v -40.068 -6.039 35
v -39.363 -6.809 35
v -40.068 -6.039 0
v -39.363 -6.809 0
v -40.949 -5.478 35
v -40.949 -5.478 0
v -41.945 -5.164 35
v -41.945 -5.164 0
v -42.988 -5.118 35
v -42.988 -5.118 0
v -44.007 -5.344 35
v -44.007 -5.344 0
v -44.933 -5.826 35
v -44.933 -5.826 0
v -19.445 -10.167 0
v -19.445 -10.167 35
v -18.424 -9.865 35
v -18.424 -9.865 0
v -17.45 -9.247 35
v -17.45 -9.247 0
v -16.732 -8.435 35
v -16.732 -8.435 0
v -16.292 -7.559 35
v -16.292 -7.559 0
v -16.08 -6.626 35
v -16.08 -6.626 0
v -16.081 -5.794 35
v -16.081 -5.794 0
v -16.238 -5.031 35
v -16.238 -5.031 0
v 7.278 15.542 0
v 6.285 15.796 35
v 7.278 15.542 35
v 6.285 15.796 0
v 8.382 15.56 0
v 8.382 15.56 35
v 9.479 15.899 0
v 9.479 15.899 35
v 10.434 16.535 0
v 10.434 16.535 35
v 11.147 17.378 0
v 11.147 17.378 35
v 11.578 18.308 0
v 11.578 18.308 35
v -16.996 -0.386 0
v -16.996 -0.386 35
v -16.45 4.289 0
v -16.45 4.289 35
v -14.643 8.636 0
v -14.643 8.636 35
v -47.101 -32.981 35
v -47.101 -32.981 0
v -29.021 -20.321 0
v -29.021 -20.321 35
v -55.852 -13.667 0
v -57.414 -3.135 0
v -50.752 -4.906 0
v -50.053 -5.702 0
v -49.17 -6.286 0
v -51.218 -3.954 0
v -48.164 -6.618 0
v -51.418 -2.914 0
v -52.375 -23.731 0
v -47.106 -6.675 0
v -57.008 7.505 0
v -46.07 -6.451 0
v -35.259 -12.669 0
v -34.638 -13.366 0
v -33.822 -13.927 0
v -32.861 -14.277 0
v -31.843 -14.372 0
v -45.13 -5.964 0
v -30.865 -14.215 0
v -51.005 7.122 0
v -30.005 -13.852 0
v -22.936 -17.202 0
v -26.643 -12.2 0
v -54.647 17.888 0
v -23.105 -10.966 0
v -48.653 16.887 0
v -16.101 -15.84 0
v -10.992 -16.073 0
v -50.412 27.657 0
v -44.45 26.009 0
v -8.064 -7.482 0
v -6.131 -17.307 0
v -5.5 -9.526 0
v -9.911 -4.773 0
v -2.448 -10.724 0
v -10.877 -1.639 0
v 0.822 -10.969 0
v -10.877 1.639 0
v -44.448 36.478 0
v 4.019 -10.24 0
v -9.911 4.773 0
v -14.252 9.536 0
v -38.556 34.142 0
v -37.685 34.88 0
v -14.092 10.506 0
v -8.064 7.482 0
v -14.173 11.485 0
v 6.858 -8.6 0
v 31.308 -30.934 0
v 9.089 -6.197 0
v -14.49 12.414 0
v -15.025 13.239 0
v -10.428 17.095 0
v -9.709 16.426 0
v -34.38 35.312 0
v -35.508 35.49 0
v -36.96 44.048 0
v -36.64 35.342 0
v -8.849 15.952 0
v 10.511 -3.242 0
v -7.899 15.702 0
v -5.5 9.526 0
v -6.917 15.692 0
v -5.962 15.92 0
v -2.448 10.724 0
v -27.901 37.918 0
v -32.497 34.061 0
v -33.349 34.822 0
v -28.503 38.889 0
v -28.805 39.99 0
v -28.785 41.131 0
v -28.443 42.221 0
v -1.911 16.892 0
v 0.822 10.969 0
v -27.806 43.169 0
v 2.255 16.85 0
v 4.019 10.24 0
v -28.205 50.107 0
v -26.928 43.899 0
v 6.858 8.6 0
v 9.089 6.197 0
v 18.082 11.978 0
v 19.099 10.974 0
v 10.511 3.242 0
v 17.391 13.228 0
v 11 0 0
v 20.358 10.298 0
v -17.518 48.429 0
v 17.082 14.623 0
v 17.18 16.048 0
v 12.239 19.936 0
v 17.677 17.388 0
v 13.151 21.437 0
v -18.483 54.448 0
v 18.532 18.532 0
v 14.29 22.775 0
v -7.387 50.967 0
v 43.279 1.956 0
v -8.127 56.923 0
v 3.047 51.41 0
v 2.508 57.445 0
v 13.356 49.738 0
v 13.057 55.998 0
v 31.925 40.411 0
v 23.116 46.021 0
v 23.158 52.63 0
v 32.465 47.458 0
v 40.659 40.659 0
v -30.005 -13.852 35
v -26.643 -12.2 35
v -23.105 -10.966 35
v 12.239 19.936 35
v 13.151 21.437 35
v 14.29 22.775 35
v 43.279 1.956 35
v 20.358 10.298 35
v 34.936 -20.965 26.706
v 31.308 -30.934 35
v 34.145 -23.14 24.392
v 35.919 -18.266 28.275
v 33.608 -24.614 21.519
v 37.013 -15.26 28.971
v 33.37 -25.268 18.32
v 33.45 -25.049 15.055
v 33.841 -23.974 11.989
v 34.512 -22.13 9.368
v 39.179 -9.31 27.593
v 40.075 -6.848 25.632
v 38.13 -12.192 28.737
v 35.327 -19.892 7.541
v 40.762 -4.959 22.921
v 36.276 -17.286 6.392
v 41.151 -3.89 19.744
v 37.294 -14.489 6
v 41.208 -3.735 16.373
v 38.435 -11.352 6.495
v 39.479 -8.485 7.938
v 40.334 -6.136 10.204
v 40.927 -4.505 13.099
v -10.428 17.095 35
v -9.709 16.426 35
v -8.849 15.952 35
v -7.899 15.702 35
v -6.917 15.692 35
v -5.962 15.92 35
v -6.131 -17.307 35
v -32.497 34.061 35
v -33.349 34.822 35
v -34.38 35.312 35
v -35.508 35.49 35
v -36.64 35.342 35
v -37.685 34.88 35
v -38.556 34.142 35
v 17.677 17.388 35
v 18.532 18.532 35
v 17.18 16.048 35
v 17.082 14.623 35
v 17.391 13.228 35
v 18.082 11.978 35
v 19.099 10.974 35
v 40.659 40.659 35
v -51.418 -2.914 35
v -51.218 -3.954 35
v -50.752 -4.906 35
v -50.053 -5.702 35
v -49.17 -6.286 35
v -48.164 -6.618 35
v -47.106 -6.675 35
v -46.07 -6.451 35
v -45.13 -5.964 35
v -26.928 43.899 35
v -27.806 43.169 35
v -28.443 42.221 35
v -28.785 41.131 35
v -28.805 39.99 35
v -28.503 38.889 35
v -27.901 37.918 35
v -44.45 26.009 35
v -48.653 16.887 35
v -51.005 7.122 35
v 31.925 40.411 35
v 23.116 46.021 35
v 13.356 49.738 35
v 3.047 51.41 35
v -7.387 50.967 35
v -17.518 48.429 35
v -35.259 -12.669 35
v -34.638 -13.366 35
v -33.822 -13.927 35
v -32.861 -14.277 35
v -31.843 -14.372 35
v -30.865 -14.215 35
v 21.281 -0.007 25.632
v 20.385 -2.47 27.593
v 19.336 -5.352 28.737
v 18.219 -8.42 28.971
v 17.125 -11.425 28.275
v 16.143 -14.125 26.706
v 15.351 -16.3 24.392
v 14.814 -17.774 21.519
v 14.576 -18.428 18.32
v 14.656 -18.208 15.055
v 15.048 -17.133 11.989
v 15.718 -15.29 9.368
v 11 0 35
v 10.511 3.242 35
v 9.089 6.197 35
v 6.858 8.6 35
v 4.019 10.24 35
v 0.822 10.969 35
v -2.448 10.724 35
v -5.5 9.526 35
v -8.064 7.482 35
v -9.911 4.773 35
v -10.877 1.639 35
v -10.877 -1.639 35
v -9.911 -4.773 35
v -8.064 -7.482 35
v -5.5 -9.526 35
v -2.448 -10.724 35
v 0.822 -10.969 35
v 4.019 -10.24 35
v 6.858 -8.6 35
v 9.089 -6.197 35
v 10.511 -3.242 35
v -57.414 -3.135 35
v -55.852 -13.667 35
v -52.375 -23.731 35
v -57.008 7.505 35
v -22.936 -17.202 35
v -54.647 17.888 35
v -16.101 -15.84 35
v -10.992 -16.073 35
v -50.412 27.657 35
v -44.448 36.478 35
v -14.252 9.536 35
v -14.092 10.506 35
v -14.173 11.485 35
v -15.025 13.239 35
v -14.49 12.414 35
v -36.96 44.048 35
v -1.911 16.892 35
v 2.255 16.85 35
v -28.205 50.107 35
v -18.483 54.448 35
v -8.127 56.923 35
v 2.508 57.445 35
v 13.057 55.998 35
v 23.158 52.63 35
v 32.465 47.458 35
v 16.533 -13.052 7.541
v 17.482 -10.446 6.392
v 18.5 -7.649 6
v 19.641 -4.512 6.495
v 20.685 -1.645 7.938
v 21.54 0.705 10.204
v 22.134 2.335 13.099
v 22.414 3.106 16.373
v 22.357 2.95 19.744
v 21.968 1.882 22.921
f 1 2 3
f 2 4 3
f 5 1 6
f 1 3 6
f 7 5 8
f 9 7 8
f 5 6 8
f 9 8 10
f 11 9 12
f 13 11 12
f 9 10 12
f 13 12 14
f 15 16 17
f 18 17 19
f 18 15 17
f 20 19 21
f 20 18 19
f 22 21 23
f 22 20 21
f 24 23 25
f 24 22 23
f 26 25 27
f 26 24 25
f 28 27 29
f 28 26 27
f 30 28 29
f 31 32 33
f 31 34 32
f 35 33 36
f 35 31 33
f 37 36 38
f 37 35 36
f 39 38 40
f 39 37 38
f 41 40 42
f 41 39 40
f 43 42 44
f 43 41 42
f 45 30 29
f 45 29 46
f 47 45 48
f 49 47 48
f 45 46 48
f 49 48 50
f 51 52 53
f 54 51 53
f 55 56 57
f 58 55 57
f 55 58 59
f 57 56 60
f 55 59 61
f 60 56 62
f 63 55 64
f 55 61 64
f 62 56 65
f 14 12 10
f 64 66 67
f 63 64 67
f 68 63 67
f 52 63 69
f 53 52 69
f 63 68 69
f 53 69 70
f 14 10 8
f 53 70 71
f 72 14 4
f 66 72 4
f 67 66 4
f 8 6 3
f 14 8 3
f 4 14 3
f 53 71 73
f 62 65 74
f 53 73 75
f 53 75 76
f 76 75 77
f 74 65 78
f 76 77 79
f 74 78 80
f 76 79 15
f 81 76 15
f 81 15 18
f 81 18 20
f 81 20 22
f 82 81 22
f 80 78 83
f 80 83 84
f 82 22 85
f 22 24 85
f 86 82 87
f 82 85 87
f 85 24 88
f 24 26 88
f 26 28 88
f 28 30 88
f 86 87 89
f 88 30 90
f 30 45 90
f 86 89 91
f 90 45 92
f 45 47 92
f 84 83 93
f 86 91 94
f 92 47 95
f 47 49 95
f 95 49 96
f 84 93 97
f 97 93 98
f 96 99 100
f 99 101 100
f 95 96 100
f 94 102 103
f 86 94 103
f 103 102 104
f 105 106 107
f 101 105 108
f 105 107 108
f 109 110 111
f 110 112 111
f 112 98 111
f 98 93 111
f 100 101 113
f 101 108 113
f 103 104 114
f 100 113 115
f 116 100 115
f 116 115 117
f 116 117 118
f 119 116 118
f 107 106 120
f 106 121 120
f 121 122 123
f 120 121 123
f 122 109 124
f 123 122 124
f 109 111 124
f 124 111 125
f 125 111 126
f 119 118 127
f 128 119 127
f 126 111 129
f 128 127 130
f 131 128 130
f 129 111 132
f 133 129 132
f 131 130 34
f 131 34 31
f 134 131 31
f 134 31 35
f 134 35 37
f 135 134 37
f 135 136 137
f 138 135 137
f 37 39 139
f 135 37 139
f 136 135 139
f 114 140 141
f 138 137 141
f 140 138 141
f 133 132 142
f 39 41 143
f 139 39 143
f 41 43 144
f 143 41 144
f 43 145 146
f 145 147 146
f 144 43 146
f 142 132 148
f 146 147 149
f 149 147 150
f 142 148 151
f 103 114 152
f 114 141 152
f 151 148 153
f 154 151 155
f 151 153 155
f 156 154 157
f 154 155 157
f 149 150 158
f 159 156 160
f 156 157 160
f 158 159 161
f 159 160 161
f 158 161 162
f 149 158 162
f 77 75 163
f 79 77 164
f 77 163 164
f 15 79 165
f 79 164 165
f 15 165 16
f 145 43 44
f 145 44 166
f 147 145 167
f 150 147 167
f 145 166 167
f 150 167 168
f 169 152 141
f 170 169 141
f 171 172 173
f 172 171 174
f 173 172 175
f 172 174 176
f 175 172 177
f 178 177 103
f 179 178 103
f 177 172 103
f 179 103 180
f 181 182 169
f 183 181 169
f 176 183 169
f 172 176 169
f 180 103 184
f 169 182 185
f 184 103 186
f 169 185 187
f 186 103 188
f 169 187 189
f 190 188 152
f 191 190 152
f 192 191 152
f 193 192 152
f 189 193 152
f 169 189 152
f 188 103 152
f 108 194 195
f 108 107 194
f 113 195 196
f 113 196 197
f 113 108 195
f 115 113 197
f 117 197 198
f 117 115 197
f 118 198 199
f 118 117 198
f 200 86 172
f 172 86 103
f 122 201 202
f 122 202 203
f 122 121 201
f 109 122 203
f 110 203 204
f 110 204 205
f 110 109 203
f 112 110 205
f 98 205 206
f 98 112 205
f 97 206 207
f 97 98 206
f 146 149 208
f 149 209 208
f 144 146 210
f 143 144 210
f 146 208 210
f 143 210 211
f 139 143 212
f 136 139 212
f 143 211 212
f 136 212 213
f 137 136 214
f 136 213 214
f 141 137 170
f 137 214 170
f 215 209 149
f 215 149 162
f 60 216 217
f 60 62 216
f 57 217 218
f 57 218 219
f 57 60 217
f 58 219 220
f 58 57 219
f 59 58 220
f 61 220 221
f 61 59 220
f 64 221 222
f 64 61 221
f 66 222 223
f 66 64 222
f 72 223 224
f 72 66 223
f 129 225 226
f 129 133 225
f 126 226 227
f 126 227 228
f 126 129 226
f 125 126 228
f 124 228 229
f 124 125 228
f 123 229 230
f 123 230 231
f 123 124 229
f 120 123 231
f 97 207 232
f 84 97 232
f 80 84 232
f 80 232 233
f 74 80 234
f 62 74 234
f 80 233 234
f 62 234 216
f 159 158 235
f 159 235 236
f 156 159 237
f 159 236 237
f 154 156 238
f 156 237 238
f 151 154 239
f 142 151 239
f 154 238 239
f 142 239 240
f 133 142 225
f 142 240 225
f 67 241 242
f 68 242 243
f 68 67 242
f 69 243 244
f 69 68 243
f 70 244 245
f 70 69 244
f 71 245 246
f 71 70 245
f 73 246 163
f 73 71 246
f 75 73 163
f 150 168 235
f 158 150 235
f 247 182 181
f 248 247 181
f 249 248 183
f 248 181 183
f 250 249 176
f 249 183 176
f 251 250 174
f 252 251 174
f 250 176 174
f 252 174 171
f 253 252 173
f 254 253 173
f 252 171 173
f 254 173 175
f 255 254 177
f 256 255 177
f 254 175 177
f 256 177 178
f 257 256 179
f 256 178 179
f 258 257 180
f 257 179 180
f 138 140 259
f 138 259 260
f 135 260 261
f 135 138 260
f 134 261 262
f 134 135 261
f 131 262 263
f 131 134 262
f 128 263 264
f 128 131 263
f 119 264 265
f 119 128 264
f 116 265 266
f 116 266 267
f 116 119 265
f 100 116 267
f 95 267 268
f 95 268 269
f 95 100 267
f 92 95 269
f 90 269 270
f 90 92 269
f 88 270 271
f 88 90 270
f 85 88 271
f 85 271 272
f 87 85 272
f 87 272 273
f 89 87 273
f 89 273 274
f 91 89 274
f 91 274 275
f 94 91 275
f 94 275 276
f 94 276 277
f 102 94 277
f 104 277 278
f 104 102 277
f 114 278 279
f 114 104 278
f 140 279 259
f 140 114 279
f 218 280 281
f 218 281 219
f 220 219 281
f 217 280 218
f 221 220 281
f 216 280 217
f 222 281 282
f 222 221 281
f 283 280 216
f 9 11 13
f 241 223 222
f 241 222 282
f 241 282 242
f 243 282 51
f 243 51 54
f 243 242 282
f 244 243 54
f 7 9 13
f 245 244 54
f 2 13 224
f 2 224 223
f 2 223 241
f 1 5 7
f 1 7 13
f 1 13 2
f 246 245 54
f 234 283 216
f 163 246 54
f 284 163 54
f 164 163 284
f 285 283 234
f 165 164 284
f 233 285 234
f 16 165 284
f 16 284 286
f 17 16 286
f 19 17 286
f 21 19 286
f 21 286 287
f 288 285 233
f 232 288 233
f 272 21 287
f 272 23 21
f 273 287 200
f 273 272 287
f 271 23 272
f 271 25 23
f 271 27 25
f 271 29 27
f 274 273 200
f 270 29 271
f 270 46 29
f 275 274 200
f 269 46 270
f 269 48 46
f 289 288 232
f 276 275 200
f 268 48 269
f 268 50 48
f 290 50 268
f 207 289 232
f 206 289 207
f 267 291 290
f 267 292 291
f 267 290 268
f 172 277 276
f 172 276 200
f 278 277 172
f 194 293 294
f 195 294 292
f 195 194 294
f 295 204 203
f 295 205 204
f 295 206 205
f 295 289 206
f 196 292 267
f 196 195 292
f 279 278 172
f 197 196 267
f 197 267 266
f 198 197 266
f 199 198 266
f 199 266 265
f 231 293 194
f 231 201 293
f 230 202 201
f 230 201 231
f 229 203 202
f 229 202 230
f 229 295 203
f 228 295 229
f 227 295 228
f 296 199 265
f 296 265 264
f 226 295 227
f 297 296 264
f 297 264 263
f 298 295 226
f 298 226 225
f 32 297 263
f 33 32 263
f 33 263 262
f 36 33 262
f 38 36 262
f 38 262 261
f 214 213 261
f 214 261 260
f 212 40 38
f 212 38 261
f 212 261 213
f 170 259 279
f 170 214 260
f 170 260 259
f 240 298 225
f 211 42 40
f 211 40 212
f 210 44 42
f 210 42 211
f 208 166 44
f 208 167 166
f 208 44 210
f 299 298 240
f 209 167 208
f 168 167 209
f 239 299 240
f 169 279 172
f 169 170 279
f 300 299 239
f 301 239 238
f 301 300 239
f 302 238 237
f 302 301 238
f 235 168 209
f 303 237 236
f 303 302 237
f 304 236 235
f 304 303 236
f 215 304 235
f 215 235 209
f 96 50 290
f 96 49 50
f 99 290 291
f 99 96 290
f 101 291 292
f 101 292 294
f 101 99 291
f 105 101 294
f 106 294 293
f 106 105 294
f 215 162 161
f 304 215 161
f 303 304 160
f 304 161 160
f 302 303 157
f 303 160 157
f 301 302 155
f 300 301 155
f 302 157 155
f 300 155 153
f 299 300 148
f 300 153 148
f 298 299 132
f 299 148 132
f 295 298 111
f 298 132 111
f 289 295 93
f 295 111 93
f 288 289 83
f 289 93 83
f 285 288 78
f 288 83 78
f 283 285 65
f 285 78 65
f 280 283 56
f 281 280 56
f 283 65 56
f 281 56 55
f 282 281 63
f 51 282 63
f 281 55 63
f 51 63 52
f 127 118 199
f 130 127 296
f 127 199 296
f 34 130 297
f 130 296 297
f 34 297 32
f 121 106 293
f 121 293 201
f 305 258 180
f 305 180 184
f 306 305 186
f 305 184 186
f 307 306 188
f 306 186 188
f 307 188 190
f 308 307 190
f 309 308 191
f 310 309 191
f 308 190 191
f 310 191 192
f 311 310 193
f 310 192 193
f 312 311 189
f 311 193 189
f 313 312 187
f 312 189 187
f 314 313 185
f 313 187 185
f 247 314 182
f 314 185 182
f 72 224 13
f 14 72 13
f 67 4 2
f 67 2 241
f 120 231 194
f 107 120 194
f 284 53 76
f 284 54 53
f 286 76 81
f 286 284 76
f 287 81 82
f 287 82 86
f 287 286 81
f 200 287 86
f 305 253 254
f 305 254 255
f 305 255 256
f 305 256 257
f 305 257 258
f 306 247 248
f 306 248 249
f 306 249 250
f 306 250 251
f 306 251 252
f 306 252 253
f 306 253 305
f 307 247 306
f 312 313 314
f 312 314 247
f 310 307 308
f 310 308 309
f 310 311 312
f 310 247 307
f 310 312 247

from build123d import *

# Parameters (mm, degrees)
SKETCH1_R           = 11
BOSS_EXTRUDE1_DEPTH = 35
FILLET2_R           = 25
FILLET5_R           = 5
CUT_EXTRUDE2_DEPTH  = 35
FILLET6_R           = 4
CUT_EXTRUDE1_DEPTH  = 20


with BuildPart() as part:
    # Sketch1 → Boss-Extrude1 (new body)
    with BuildSketch(Plane.XY):
        with BuildLine():
            Line((-47.101242547, -32.98064509), (-15.03971276, -10.530920247))
            ThreePointArc((-15.03971276, -10.530920247), (-11.176920202, -14.566045997), (-6.279523746, -17.252849698))
            Line((-6.279523746, -17.252849698), (31.308181085, -30.933655431))
            Line((31.308181085, -30.933655431), (43.278886102, 1.955586297))
            Line((43.278886102, 1.955586297), (12.982550619, 12.982550619))
            Line((12.982550619, 12.982550619), (40.658639918, 40.658639918))
            ThreePointArc((40.658639918, 40.658639918), (-36.960287557, 44.047555479), (-47.101242547, -32.98064509))
        make_face()
        Circle(SKETCH1_R, mode=Mode.SUBTRACT)
    extrude(amount=BOSS_EXTRUDE1_DEPTH)

    # Fillet2
    fillet2_edges = [part.edges().sort_by_distance(p)[0] for p in [
        (-15.03971276, -10.530920247, 17.5),
    ]]
    fillet(fillet2_edges, radius=FILLET2_R)

    # Fillet5
    fillet5_edges = [part.edges().sort_by_distance(p)[0] for p in [
        (12.982550619, 12.982550619, 17.5),
    ]]
    fillet(fillet5_edges, radius=FILLET5_R)

    # Sketch4 → Cut-Extrude2 (cut)
    with BuildSketch(Plane.XY.offset(35)):
        with BuildLine():
            Line((-41.656871027, -3.532188748), (-33.053224482, -15.819469412))
            Line((-33.053224482, -15.819469412), (-32.46214687, -15.405592412))
            ThreePointArc((-32.46214687, -15.405592412), (-23.62229066, -11.116679876), (-13.884259621, -9.809553241))
            ThreePointArc((-13.884259621, -9.809553241), (-16.986342471, 0.681299827), (-13.054027301, 10.890012453))
            Line((-13.054027301, 10.890012453), (-35.345481592, 37.455933189))
            ThreePointArc((-35.345481592, 37.455933189), (-49.017443505, 15.796842477), (-50.564853617, -9.769625307))
            Line((-50.564853617, -9.769625307), (-41.656871027, -3.532188748))
        make_face()
        with BuildLine():
            ThreePointArc((31.925370041, 40.410651415), (0.741106983, 51.494667301), (-30.749214933, 41.312658847))
            Line((-30.749214933, 41.312658847), (-8.457760642, 14.746738111))
            ThreePointArc((-8.457760642, 14.746738111), (1.75926732, 16.908724922), (11.312388901, 12.68975403))
            ThreePointArc((11.312388901, 12.68975403), (11.517857333, 18.111100205), (14.289586512, 22.774867886))
            Line((14.289586512, 22.774867886), (31.925370041, 40.410651415))
        make_face()
    extrude(amount=-CUT_EXTRUDE2_DEPTH, mode=Mode.SUBTRACT)

    # Fillet6
    fillet6_edges = [part.edges().sort_by_distance(p)[0] for p in [
        (-13.884259621, -9.809553241, 17.5),
        (-13.054027301, 10.890012453, 17.5),
        (-35.345481592, 37.455933189, 17.5),
        (-30.749214933, 41.312658847, 17.5),
        (-8.457760642, 14.746738111, 17.5),
        (11.312388901, 12.68975403, 17.5),
        (-50.564853617, -9.769625307, 17.5),
        (-33.053224482, -15.819469412, 17.5),
        (-41.656871027, -3.532188748, 17.5),
    ]]
    fillet(fillet6_edges, radius=FILLET6_R)

    # Sketch2 → Cut-Extrude1 (cut)
    with BuildSketch(Plane(origin=(37.587704831, -13.680805733, 0), x_dir=(0, 0, -1), z_dir=(0.939692620785907, -0.34202014332567265, 0))):
        with BuildLine():
            ThreePointArc((-6, -0.86009916), (-13.099140528, 9.764515464), (-25.631727984, 7.271628823))
            Line((-25.631727984, 7.271628823), (-9.368272016, -8.991827144))
            ThreePointArc((-9.368272016, -8.991827144), (-6.875385376, -5.260958632), (-6, -0.86009916))
        make_face()
        with BuildLine():
            Line((-9.368272016, -8.991827144), (-25.631727984, 7.271628823))
            ThreePointArc((-25.631727984, 7.271628823), (-25.631727984, -8.991827144), (-9.368272016, -8.991827144))
        make_face()
    extrude(amount=-CUT_EXTRUDE1_DEPTH, mode=Mode.SUBTRACT)


solid = part.part
